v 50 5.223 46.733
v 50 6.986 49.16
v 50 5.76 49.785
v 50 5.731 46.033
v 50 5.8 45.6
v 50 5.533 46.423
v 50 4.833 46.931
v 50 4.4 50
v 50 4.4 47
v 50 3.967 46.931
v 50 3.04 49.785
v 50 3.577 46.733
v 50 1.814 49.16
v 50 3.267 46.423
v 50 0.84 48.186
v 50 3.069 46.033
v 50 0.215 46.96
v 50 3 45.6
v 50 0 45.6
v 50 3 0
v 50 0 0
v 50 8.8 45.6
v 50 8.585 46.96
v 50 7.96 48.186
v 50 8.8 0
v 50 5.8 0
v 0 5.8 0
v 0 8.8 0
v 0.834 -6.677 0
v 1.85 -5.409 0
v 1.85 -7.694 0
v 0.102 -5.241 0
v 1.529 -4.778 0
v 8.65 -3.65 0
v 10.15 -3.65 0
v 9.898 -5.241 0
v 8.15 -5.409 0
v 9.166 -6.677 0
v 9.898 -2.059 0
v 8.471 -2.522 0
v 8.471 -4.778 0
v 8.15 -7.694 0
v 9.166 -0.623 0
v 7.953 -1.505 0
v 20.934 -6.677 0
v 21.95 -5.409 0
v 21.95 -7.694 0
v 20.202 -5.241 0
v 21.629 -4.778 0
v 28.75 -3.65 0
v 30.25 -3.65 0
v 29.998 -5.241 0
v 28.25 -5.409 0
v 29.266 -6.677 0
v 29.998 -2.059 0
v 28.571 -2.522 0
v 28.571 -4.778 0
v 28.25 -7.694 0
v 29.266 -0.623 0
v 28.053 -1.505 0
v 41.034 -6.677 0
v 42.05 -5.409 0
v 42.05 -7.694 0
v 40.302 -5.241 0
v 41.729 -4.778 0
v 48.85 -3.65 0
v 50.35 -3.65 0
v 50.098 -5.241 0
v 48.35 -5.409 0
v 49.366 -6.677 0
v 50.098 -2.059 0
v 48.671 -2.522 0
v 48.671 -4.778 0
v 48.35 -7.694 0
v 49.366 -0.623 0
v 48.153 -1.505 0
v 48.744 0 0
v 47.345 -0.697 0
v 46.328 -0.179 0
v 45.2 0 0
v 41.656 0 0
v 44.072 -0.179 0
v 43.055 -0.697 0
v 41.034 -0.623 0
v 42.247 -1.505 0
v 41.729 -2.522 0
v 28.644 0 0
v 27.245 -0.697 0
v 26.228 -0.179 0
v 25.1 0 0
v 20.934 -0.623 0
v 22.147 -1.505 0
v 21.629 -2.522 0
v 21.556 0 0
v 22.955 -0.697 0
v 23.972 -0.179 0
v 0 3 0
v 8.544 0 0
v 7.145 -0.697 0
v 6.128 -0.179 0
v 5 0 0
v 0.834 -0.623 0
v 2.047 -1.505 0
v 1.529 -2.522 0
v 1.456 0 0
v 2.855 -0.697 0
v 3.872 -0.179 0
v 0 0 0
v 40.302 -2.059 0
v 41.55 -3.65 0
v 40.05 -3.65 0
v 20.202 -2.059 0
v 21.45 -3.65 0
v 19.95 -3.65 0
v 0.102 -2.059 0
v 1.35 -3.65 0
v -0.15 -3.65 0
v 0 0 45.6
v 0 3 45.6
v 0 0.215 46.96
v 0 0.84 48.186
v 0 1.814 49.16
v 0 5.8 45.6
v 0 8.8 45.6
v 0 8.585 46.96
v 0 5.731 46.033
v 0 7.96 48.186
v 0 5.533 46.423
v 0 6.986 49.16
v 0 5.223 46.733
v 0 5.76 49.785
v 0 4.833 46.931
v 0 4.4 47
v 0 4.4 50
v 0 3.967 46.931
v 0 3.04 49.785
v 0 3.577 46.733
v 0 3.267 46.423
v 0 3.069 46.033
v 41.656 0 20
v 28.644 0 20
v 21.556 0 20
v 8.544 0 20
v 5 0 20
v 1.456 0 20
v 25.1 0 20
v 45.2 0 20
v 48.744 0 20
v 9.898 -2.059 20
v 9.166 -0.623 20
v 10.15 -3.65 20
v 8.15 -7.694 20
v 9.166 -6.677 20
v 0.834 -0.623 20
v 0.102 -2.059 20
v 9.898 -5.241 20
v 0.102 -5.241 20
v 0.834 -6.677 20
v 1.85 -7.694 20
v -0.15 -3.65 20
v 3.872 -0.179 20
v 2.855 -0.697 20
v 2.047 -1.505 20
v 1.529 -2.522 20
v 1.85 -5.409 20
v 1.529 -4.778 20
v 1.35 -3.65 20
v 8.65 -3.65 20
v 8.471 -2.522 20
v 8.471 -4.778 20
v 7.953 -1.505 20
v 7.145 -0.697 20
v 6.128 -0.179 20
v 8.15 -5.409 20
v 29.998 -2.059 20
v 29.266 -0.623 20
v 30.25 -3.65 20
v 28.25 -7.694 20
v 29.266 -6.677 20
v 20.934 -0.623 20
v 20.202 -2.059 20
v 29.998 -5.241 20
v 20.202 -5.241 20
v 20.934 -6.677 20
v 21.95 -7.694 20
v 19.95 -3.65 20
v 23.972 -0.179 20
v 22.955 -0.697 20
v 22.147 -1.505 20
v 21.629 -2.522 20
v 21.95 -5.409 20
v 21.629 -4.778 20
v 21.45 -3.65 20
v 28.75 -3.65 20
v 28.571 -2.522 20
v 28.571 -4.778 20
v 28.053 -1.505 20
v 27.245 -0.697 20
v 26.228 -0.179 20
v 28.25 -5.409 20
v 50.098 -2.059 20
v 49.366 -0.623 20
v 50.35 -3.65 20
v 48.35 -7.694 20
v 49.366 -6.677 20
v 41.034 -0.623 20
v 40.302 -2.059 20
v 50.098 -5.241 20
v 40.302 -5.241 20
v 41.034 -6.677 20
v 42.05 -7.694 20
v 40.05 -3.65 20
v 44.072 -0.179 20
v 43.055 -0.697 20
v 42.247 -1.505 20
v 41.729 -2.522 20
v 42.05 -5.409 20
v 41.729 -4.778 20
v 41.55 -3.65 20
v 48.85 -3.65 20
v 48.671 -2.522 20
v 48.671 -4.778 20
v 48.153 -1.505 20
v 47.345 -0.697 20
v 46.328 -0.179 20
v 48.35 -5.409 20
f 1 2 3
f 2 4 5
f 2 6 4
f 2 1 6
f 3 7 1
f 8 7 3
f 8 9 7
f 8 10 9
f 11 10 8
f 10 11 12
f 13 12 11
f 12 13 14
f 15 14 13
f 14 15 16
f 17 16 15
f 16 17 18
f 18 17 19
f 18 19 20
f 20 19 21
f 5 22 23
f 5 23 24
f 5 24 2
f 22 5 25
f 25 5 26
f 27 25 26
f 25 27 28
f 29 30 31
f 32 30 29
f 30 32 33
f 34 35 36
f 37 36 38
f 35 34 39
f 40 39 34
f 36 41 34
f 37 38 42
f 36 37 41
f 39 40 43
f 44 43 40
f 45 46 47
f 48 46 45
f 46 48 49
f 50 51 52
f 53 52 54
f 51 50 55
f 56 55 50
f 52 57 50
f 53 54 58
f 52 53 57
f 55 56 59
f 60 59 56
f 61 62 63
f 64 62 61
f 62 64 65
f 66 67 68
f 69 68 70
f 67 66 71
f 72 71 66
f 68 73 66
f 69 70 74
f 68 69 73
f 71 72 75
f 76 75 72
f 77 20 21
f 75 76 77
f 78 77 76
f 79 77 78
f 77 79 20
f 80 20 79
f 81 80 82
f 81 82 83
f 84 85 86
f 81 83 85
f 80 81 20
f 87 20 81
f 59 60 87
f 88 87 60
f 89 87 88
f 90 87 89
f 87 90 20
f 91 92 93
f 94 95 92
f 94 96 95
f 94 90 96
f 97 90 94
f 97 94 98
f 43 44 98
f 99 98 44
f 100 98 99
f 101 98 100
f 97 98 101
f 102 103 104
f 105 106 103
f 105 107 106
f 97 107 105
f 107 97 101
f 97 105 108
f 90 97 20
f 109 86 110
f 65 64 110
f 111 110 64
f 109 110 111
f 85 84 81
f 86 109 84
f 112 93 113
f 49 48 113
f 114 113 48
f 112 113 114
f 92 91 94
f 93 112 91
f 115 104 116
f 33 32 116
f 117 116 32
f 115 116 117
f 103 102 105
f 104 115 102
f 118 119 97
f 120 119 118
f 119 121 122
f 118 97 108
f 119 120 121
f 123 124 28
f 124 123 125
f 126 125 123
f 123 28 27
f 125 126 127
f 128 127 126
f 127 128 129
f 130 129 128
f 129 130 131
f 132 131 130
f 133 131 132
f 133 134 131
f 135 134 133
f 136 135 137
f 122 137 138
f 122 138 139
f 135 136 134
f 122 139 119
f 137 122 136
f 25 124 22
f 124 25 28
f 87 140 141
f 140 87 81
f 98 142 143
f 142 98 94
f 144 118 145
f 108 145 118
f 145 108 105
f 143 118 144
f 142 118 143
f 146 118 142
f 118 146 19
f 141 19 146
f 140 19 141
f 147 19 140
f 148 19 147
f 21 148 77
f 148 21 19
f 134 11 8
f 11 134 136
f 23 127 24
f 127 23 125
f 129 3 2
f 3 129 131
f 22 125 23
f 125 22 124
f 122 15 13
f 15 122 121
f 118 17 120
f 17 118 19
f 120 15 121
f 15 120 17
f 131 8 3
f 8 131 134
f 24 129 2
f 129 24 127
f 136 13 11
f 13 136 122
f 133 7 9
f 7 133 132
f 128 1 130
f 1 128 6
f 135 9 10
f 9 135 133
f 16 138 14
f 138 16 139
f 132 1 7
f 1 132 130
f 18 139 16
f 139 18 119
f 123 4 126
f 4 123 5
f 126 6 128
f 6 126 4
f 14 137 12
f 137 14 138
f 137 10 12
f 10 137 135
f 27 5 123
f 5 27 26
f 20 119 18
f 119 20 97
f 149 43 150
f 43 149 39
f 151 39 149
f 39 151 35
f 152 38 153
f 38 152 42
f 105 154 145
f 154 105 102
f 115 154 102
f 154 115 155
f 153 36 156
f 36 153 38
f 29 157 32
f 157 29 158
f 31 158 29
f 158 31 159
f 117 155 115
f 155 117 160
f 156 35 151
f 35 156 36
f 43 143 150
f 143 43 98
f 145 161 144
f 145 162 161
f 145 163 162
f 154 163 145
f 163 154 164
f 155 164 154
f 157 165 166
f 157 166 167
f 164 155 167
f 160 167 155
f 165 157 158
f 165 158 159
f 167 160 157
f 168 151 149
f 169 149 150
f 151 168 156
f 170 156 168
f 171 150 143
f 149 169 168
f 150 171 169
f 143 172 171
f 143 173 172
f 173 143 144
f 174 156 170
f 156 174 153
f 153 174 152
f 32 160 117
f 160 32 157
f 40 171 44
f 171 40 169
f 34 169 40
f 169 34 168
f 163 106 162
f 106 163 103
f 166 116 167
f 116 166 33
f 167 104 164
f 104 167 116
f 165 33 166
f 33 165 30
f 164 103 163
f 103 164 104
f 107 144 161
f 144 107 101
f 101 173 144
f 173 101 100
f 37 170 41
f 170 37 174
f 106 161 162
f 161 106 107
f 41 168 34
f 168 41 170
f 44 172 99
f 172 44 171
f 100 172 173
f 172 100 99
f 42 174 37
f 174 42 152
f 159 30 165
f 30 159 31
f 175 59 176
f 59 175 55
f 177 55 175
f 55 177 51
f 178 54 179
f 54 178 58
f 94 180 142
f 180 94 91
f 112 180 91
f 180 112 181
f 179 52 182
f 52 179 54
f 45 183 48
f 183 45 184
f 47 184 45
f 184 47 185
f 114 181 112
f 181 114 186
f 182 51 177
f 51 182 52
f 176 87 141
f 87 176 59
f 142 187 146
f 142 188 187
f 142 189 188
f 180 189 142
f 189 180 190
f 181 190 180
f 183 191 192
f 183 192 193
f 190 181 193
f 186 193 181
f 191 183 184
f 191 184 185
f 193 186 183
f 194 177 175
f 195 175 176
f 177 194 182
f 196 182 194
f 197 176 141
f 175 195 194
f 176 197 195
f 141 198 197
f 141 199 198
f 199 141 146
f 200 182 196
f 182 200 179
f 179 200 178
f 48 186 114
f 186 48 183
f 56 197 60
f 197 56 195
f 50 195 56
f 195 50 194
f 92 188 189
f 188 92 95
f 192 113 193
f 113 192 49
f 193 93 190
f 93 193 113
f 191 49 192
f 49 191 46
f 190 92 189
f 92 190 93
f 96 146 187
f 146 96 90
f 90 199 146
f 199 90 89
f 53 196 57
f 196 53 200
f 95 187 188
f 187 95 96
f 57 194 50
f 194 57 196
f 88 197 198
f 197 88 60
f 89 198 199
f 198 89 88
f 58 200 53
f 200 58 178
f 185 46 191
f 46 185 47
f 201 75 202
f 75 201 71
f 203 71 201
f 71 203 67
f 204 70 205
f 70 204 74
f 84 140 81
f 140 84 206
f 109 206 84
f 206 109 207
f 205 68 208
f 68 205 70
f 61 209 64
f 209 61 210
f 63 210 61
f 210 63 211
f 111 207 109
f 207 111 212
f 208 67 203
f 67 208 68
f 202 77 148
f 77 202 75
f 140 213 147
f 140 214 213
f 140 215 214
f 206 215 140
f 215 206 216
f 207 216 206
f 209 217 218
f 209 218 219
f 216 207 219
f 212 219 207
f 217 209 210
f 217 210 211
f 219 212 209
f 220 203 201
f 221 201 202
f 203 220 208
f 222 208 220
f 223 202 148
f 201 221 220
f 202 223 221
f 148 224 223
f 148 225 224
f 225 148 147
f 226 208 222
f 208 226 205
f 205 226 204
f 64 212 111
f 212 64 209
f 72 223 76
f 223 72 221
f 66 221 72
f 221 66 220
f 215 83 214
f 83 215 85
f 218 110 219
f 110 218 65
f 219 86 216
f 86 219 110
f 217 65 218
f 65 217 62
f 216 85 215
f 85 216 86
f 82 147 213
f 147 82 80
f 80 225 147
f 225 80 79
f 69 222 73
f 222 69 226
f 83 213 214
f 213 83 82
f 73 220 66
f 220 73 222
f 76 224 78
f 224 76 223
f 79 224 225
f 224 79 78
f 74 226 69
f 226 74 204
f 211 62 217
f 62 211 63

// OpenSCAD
$fn = 20;
height = 50; //the total height of the object.
width = 50; //the width of the clip.
thickness = 3; //clip thickness.
binder_thickness = 2.8; //measured width of your own binder.
pencil_diameter = 7.3; //measured width of your own pencils.
clip_number = 3;

top_arc_diameter = (2*thickness)+binder_thickness;
inset = 5;
clip_gap = pencil_diameter-1;


//Entire Object
union(){

 //Clip - gap inside clip for binder - inner arch
 difference(){
  
  //Main binder clip structure + top arch
  union(){
   
   //Main binder clip structure 
   cube([width, (thickness*2)+binder_thickness, height-(top_arc_diameter/2)]);
   
   //Top arch of binder clip
   rotate([90, 90, 90]){
    translate([-height+(top_arc_diameter/2), top_arc_diameter/2, 0]){
     cylinder(width, top_arc_diameter/2, top_arc_diameter/2);
    }
   }
  }

  //Rounding out the inside of the binder clip
  rotate([90, 90, 90]){
   translate([-height+(top_arc_diameter/2), top_arc_diameter/2, 0]){
    cylinder(width, binder_thickness/2, binder_thickness/2);
   }
  }

  //The gap inside the binder clip
  translate([-0.5, (10-4)/2, 0]){
   cube([width+1, binder_thickness, height-top_arc_diameter/2]);
  }
 }

 //Pencil clip(s)
 for (i = [0 : clip_number-1]){
  translate([(((width+pencil_diameter+thickness)/clip_number)*i),0,0]){
   difference(){
    translate([inset, -pencil_diameter/2, 0]){
     cylinder(20, (pencil_diameter/2)+(thickness/2), (pencil_diameter/2)+(thickness/2));
    }
    translate([inset, -pencil_diameter/2, 0]){
     cylinder(20, (pencil_diameter/2), (pencil_diameter/2));
    }
    translate([inset-clip_gap/2, -(pencil_diameter+thickness), 0]){
     cube([clip_gap, 5, 20]);
    }
   }
  }
 }
}
